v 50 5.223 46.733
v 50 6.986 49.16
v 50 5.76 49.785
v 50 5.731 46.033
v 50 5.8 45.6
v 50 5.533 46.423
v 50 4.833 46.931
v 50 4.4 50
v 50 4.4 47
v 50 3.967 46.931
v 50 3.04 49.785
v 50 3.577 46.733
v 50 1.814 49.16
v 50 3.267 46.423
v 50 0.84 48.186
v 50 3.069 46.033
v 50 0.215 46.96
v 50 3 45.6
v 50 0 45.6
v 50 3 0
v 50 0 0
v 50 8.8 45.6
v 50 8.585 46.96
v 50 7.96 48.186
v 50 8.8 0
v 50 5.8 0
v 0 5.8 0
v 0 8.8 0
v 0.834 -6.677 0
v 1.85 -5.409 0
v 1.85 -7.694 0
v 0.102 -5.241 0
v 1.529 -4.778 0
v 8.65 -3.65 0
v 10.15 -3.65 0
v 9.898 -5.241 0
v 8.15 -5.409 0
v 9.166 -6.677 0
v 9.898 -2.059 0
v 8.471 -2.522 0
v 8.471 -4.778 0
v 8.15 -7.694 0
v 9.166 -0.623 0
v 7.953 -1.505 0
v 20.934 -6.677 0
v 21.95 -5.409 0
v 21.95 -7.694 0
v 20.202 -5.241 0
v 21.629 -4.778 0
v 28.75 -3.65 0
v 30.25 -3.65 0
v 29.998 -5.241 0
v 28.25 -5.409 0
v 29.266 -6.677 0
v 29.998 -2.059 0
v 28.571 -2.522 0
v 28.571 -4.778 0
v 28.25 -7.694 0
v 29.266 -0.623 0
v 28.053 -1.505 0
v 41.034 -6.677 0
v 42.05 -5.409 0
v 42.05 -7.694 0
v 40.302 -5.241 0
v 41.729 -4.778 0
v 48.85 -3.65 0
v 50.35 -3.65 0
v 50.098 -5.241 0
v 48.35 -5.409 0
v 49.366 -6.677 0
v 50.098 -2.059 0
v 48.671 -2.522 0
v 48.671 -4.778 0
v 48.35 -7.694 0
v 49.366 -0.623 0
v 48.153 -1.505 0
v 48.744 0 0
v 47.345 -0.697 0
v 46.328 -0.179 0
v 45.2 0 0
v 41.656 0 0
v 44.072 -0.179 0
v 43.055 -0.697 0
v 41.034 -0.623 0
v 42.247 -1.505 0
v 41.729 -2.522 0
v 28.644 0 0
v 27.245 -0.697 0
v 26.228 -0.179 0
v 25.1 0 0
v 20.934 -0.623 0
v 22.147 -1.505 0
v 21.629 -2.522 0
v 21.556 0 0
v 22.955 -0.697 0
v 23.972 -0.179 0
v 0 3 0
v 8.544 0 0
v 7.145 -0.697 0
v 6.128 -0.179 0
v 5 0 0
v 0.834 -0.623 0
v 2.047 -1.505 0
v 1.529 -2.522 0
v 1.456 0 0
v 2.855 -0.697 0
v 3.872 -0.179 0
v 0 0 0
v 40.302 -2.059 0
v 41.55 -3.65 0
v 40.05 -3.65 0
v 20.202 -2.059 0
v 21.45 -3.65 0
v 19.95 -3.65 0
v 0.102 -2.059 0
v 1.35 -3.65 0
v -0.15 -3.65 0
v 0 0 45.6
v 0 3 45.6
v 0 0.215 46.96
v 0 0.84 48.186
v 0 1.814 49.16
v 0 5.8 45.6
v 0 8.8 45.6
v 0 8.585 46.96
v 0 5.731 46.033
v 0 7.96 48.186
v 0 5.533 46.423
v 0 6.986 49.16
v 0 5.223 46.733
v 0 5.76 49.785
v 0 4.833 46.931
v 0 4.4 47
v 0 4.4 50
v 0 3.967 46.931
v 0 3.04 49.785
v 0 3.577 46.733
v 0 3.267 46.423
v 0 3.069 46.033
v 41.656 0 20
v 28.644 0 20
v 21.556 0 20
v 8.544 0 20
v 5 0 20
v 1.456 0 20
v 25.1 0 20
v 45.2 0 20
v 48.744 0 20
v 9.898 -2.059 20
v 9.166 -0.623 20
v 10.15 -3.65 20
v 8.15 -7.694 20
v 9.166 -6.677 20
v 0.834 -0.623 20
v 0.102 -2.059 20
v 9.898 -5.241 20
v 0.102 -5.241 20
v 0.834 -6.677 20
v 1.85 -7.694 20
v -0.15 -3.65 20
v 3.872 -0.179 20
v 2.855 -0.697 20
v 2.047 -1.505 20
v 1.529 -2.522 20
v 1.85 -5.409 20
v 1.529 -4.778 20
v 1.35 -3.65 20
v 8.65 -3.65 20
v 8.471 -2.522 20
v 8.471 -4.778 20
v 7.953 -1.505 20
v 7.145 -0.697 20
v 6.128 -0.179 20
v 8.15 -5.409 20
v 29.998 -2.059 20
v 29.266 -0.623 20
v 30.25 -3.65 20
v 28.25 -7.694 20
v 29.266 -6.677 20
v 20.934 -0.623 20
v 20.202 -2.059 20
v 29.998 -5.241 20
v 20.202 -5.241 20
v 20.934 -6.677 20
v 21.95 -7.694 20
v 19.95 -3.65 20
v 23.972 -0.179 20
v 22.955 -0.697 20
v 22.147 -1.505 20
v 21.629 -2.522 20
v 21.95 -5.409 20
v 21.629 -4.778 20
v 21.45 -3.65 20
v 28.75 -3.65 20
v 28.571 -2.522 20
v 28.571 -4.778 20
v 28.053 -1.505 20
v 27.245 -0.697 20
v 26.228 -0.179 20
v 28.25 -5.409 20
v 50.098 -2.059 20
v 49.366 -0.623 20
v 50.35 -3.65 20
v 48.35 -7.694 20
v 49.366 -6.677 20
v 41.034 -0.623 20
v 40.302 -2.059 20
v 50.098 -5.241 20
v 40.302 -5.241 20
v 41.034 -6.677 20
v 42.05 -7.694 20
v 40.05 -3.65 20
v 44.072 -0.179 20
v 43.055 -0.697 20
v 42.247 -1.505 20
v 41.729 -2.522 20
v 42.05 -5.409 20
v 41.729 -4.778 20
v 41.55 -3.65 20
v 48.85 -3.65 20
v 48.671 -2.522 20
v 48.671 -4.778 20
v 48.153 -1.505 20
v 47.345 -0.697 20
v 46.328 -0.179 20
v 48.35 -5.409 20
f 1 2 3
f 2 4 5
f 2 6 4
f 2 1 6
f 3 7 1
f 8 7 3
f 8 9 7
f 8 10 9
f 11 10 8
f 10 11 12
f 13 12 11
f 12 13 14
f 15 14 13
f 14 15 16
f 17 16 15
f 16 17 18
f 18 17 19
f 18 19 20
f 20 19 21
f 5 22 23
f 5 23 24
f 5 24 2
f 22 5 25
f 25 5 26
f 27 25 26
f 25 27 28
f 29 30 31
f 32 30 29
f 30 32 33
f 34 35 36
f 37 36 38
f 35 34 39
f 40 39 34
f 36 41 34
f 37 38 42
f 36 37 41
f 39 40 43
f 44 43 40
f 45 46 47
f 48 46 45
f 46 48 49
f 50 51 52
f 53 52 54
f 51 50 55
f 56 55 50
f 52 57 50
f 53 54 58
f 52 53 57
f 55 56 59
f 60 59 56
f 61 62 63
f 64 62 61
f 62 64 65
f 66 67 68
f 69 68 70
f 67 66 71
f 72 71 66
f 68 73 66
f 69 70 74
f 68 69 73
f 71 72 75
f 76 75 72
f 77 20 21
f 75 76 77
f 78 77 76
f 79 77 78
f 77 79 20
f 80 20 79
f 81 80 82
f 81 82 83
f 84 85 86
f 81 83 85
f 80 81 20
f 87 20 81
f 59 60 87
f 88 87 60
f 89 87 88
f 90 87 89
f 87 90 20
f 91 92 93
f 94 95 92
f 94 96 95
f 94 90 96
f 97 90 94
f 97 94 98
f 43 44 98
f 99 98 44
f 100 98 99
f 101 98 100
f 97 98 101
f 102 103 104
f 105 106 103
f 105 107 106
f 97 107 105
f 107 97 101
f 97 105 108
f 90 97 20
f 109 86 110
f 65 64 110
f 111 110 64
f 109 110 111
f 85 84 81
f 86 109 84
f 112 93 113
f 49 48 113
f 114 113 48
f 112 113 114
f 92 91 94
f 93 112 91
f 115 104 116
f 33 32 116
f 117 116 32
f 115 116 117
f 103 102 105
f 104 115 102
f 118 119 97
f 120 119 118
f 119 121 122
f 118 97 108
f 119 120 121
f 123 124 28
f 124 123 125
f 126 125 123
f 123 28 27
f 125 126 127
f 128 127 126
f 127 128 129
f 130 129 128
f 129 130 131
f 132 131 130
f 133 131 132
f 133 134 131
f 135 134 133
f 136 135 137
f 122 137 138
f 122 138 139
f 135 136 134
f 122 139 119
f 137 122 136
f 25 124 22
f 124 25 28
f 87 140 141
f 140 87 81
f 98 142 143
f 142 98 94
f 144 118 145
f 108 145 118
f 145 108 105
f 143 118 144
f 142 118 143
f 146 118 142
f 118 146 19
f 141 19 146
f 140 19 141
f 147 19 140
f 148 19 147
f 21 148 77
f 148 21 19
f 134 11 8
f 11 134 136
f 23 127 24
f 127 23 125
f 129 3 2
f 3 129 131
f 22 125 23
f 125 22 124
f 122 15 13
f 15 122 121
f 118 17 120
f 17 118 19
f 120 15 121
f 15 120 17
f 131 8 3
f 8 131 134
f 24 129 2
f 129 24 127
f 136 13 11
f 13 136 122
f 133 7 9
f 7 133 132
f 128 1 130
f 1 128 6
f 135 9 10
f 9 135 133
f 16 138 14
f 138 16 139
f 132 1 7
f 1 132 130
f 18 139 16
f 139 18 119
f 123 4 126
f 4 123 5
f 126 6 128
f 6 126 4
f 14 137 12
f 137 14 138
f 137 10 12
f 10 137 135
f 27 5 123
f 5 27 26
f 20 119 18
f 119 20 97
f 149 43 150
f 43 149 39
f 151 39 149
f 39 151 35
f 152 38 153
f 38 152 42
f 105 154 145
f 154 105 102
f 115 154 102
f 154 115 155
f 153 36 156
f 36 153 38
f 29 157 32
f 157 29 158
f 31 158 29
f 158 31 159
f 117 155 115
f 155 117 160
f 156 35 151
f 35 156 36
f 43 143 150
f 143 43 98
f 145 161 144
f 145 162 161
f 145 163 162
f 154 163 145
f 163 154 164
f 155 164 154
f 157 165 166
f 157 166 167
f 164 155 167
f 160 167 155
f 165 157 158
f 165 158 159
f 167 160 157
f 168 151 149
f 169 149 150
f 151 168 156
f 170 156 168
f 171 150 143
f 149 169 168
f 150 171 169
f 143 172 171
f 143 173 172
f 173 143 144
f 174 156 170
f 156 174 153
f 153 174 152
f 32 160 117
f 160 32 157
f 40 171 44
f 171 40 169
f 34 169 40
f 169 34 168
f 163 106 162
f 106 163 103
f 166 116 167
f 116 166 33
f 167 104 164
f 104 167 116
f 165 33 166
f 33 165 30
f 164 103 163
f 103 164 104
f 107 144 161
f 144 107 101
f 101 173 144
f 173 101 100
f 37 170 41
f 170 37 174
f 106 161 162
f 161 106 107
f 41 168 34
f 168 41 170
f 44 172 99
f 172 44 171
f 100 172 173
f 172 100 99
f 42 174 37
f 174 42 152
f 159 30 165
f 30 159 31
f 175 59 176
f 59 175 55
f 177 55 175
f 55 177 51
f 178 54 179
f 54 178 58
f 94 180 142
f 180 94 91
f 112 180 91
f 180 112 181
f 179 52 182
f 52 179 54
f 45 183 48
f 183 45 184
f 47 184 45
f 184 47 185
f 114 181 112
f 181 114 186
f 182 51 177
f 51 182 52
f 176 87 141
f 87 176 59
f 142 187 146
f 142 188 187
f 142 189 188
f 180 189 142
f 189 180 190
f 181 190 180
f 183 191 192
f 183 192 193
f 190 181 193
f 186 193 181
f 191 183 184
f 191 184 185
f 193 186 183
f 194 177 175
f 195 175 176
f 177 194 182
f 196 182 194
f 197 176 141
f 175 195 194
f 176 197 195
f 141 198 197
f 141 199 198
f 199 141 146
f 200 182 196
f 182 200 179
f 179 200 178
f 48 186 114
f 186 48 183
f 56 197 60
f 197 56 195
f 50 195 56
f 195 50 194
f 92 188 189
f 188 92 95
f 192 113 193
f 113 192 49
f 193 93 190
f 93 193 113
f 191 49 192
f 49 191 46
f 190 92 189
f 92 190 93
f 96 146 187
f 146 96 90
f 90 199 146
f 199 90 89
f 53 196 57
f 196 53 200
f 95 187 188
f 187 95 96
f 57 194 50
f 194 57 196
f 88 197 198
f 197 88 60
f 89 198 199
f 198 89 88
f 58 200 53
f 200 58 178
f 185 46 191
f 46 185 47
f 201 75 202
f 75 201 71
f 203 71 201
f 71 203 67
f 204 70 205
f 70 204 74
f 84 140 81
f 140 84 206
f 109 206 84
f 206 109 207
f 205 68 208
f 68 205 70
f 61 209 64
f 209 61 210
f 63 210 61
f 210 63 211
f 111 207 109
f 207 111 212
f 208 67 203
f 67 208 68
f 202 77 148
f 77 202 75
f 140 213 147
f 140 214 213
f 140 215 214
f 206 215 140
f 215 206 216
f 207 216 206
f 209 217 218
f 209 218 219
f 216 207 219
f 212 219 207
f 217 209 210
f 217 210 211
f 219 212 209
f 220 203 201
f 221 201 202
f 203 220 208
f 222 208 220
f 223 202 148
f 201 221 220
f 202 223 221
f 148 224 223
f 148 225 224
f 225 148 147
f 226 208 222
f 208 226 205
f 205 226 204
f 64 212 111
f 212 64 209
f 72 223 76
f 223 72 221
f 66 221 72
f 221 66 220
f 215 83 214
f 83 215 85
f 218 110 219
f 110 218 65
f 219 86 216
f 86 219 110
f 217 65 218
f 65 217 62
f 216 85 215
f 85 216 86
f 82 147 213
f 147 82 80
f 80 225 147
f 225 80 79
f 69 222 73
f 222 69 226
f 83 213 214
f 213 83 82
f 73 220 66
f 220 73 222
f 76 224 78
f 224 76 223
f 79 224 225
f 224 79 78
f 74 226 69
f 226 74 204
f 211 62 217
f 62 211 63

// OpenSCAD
$fn = 20;
height = 50; //the total height of the object.
width = 50; //the width of the clip.
thickness = 3; //clip thickness.
binder_thickness = 2.8; //measured width of your own binder.
pencil_diameter = 7.3; //measured width of your own pencils.
clip_number = 3;

top_arc_diameter = (2*thickness)+binder_thickness;
inset = 5;
clip_gap = pencil_diameter-1;


//Entire Object
union(){

 //Clip - gap inside clip for binder - inner arch
 difference(){
  
  //Main binder clip structure + top arch
  union(){
   
   //Main binder clip structure 
   cube([width, (thickness*2)+binder_thickness, height-(top_arc_diameter/2)]);
   
   //Top arch of binder clip
   rotate([90, 90, 90]){
    translate([-height+(top_arc_diameter/2), top_arc_diameter/2, 0]){
     cylinder(width, top_arc_diameter/2, top_arc_diameter/2);
    }
   }
  }

  //Rounding out the inside of the binder clip
  rotate([90, 90, 90]){
   translate([-height+(top_arc_diameter/2), top_arc_diameter/2, 0]){
    cylinder(width, binder_thickness/2, binder_thickness/2);
   }
  }

  //The gap inside the binder clip
  translate([-0.5, (10-4)/2, 0]){
   cube([width+1, binder_thickness, height-top_arc_diameter/2]);
  }
 }

 //Pencil clip(s)
 for (i = [0 : clip_number-1]){
  translate([(((width+pencil_diameter+thickness)/clip_number)*i),0,0]){
   difference(){
    translate([inset, -pencil_diameter/2, 0]){
     cylinder(20, (pencil_diameter/2)+(thickness/2), (pencil_diameter/2)+(thickness/2));
    }
    translate([inset, -pencil_diameter/2, 0]){
     cylinder(20, (pencil_diameter/2), (pencil_diameter/2));
    }
    translate([inset-clip_gap/2, -(pencil_diameter+thickness), 0]){
     cube([clip_gap, 5, 20]);
    }
   }
  }
 }
}
